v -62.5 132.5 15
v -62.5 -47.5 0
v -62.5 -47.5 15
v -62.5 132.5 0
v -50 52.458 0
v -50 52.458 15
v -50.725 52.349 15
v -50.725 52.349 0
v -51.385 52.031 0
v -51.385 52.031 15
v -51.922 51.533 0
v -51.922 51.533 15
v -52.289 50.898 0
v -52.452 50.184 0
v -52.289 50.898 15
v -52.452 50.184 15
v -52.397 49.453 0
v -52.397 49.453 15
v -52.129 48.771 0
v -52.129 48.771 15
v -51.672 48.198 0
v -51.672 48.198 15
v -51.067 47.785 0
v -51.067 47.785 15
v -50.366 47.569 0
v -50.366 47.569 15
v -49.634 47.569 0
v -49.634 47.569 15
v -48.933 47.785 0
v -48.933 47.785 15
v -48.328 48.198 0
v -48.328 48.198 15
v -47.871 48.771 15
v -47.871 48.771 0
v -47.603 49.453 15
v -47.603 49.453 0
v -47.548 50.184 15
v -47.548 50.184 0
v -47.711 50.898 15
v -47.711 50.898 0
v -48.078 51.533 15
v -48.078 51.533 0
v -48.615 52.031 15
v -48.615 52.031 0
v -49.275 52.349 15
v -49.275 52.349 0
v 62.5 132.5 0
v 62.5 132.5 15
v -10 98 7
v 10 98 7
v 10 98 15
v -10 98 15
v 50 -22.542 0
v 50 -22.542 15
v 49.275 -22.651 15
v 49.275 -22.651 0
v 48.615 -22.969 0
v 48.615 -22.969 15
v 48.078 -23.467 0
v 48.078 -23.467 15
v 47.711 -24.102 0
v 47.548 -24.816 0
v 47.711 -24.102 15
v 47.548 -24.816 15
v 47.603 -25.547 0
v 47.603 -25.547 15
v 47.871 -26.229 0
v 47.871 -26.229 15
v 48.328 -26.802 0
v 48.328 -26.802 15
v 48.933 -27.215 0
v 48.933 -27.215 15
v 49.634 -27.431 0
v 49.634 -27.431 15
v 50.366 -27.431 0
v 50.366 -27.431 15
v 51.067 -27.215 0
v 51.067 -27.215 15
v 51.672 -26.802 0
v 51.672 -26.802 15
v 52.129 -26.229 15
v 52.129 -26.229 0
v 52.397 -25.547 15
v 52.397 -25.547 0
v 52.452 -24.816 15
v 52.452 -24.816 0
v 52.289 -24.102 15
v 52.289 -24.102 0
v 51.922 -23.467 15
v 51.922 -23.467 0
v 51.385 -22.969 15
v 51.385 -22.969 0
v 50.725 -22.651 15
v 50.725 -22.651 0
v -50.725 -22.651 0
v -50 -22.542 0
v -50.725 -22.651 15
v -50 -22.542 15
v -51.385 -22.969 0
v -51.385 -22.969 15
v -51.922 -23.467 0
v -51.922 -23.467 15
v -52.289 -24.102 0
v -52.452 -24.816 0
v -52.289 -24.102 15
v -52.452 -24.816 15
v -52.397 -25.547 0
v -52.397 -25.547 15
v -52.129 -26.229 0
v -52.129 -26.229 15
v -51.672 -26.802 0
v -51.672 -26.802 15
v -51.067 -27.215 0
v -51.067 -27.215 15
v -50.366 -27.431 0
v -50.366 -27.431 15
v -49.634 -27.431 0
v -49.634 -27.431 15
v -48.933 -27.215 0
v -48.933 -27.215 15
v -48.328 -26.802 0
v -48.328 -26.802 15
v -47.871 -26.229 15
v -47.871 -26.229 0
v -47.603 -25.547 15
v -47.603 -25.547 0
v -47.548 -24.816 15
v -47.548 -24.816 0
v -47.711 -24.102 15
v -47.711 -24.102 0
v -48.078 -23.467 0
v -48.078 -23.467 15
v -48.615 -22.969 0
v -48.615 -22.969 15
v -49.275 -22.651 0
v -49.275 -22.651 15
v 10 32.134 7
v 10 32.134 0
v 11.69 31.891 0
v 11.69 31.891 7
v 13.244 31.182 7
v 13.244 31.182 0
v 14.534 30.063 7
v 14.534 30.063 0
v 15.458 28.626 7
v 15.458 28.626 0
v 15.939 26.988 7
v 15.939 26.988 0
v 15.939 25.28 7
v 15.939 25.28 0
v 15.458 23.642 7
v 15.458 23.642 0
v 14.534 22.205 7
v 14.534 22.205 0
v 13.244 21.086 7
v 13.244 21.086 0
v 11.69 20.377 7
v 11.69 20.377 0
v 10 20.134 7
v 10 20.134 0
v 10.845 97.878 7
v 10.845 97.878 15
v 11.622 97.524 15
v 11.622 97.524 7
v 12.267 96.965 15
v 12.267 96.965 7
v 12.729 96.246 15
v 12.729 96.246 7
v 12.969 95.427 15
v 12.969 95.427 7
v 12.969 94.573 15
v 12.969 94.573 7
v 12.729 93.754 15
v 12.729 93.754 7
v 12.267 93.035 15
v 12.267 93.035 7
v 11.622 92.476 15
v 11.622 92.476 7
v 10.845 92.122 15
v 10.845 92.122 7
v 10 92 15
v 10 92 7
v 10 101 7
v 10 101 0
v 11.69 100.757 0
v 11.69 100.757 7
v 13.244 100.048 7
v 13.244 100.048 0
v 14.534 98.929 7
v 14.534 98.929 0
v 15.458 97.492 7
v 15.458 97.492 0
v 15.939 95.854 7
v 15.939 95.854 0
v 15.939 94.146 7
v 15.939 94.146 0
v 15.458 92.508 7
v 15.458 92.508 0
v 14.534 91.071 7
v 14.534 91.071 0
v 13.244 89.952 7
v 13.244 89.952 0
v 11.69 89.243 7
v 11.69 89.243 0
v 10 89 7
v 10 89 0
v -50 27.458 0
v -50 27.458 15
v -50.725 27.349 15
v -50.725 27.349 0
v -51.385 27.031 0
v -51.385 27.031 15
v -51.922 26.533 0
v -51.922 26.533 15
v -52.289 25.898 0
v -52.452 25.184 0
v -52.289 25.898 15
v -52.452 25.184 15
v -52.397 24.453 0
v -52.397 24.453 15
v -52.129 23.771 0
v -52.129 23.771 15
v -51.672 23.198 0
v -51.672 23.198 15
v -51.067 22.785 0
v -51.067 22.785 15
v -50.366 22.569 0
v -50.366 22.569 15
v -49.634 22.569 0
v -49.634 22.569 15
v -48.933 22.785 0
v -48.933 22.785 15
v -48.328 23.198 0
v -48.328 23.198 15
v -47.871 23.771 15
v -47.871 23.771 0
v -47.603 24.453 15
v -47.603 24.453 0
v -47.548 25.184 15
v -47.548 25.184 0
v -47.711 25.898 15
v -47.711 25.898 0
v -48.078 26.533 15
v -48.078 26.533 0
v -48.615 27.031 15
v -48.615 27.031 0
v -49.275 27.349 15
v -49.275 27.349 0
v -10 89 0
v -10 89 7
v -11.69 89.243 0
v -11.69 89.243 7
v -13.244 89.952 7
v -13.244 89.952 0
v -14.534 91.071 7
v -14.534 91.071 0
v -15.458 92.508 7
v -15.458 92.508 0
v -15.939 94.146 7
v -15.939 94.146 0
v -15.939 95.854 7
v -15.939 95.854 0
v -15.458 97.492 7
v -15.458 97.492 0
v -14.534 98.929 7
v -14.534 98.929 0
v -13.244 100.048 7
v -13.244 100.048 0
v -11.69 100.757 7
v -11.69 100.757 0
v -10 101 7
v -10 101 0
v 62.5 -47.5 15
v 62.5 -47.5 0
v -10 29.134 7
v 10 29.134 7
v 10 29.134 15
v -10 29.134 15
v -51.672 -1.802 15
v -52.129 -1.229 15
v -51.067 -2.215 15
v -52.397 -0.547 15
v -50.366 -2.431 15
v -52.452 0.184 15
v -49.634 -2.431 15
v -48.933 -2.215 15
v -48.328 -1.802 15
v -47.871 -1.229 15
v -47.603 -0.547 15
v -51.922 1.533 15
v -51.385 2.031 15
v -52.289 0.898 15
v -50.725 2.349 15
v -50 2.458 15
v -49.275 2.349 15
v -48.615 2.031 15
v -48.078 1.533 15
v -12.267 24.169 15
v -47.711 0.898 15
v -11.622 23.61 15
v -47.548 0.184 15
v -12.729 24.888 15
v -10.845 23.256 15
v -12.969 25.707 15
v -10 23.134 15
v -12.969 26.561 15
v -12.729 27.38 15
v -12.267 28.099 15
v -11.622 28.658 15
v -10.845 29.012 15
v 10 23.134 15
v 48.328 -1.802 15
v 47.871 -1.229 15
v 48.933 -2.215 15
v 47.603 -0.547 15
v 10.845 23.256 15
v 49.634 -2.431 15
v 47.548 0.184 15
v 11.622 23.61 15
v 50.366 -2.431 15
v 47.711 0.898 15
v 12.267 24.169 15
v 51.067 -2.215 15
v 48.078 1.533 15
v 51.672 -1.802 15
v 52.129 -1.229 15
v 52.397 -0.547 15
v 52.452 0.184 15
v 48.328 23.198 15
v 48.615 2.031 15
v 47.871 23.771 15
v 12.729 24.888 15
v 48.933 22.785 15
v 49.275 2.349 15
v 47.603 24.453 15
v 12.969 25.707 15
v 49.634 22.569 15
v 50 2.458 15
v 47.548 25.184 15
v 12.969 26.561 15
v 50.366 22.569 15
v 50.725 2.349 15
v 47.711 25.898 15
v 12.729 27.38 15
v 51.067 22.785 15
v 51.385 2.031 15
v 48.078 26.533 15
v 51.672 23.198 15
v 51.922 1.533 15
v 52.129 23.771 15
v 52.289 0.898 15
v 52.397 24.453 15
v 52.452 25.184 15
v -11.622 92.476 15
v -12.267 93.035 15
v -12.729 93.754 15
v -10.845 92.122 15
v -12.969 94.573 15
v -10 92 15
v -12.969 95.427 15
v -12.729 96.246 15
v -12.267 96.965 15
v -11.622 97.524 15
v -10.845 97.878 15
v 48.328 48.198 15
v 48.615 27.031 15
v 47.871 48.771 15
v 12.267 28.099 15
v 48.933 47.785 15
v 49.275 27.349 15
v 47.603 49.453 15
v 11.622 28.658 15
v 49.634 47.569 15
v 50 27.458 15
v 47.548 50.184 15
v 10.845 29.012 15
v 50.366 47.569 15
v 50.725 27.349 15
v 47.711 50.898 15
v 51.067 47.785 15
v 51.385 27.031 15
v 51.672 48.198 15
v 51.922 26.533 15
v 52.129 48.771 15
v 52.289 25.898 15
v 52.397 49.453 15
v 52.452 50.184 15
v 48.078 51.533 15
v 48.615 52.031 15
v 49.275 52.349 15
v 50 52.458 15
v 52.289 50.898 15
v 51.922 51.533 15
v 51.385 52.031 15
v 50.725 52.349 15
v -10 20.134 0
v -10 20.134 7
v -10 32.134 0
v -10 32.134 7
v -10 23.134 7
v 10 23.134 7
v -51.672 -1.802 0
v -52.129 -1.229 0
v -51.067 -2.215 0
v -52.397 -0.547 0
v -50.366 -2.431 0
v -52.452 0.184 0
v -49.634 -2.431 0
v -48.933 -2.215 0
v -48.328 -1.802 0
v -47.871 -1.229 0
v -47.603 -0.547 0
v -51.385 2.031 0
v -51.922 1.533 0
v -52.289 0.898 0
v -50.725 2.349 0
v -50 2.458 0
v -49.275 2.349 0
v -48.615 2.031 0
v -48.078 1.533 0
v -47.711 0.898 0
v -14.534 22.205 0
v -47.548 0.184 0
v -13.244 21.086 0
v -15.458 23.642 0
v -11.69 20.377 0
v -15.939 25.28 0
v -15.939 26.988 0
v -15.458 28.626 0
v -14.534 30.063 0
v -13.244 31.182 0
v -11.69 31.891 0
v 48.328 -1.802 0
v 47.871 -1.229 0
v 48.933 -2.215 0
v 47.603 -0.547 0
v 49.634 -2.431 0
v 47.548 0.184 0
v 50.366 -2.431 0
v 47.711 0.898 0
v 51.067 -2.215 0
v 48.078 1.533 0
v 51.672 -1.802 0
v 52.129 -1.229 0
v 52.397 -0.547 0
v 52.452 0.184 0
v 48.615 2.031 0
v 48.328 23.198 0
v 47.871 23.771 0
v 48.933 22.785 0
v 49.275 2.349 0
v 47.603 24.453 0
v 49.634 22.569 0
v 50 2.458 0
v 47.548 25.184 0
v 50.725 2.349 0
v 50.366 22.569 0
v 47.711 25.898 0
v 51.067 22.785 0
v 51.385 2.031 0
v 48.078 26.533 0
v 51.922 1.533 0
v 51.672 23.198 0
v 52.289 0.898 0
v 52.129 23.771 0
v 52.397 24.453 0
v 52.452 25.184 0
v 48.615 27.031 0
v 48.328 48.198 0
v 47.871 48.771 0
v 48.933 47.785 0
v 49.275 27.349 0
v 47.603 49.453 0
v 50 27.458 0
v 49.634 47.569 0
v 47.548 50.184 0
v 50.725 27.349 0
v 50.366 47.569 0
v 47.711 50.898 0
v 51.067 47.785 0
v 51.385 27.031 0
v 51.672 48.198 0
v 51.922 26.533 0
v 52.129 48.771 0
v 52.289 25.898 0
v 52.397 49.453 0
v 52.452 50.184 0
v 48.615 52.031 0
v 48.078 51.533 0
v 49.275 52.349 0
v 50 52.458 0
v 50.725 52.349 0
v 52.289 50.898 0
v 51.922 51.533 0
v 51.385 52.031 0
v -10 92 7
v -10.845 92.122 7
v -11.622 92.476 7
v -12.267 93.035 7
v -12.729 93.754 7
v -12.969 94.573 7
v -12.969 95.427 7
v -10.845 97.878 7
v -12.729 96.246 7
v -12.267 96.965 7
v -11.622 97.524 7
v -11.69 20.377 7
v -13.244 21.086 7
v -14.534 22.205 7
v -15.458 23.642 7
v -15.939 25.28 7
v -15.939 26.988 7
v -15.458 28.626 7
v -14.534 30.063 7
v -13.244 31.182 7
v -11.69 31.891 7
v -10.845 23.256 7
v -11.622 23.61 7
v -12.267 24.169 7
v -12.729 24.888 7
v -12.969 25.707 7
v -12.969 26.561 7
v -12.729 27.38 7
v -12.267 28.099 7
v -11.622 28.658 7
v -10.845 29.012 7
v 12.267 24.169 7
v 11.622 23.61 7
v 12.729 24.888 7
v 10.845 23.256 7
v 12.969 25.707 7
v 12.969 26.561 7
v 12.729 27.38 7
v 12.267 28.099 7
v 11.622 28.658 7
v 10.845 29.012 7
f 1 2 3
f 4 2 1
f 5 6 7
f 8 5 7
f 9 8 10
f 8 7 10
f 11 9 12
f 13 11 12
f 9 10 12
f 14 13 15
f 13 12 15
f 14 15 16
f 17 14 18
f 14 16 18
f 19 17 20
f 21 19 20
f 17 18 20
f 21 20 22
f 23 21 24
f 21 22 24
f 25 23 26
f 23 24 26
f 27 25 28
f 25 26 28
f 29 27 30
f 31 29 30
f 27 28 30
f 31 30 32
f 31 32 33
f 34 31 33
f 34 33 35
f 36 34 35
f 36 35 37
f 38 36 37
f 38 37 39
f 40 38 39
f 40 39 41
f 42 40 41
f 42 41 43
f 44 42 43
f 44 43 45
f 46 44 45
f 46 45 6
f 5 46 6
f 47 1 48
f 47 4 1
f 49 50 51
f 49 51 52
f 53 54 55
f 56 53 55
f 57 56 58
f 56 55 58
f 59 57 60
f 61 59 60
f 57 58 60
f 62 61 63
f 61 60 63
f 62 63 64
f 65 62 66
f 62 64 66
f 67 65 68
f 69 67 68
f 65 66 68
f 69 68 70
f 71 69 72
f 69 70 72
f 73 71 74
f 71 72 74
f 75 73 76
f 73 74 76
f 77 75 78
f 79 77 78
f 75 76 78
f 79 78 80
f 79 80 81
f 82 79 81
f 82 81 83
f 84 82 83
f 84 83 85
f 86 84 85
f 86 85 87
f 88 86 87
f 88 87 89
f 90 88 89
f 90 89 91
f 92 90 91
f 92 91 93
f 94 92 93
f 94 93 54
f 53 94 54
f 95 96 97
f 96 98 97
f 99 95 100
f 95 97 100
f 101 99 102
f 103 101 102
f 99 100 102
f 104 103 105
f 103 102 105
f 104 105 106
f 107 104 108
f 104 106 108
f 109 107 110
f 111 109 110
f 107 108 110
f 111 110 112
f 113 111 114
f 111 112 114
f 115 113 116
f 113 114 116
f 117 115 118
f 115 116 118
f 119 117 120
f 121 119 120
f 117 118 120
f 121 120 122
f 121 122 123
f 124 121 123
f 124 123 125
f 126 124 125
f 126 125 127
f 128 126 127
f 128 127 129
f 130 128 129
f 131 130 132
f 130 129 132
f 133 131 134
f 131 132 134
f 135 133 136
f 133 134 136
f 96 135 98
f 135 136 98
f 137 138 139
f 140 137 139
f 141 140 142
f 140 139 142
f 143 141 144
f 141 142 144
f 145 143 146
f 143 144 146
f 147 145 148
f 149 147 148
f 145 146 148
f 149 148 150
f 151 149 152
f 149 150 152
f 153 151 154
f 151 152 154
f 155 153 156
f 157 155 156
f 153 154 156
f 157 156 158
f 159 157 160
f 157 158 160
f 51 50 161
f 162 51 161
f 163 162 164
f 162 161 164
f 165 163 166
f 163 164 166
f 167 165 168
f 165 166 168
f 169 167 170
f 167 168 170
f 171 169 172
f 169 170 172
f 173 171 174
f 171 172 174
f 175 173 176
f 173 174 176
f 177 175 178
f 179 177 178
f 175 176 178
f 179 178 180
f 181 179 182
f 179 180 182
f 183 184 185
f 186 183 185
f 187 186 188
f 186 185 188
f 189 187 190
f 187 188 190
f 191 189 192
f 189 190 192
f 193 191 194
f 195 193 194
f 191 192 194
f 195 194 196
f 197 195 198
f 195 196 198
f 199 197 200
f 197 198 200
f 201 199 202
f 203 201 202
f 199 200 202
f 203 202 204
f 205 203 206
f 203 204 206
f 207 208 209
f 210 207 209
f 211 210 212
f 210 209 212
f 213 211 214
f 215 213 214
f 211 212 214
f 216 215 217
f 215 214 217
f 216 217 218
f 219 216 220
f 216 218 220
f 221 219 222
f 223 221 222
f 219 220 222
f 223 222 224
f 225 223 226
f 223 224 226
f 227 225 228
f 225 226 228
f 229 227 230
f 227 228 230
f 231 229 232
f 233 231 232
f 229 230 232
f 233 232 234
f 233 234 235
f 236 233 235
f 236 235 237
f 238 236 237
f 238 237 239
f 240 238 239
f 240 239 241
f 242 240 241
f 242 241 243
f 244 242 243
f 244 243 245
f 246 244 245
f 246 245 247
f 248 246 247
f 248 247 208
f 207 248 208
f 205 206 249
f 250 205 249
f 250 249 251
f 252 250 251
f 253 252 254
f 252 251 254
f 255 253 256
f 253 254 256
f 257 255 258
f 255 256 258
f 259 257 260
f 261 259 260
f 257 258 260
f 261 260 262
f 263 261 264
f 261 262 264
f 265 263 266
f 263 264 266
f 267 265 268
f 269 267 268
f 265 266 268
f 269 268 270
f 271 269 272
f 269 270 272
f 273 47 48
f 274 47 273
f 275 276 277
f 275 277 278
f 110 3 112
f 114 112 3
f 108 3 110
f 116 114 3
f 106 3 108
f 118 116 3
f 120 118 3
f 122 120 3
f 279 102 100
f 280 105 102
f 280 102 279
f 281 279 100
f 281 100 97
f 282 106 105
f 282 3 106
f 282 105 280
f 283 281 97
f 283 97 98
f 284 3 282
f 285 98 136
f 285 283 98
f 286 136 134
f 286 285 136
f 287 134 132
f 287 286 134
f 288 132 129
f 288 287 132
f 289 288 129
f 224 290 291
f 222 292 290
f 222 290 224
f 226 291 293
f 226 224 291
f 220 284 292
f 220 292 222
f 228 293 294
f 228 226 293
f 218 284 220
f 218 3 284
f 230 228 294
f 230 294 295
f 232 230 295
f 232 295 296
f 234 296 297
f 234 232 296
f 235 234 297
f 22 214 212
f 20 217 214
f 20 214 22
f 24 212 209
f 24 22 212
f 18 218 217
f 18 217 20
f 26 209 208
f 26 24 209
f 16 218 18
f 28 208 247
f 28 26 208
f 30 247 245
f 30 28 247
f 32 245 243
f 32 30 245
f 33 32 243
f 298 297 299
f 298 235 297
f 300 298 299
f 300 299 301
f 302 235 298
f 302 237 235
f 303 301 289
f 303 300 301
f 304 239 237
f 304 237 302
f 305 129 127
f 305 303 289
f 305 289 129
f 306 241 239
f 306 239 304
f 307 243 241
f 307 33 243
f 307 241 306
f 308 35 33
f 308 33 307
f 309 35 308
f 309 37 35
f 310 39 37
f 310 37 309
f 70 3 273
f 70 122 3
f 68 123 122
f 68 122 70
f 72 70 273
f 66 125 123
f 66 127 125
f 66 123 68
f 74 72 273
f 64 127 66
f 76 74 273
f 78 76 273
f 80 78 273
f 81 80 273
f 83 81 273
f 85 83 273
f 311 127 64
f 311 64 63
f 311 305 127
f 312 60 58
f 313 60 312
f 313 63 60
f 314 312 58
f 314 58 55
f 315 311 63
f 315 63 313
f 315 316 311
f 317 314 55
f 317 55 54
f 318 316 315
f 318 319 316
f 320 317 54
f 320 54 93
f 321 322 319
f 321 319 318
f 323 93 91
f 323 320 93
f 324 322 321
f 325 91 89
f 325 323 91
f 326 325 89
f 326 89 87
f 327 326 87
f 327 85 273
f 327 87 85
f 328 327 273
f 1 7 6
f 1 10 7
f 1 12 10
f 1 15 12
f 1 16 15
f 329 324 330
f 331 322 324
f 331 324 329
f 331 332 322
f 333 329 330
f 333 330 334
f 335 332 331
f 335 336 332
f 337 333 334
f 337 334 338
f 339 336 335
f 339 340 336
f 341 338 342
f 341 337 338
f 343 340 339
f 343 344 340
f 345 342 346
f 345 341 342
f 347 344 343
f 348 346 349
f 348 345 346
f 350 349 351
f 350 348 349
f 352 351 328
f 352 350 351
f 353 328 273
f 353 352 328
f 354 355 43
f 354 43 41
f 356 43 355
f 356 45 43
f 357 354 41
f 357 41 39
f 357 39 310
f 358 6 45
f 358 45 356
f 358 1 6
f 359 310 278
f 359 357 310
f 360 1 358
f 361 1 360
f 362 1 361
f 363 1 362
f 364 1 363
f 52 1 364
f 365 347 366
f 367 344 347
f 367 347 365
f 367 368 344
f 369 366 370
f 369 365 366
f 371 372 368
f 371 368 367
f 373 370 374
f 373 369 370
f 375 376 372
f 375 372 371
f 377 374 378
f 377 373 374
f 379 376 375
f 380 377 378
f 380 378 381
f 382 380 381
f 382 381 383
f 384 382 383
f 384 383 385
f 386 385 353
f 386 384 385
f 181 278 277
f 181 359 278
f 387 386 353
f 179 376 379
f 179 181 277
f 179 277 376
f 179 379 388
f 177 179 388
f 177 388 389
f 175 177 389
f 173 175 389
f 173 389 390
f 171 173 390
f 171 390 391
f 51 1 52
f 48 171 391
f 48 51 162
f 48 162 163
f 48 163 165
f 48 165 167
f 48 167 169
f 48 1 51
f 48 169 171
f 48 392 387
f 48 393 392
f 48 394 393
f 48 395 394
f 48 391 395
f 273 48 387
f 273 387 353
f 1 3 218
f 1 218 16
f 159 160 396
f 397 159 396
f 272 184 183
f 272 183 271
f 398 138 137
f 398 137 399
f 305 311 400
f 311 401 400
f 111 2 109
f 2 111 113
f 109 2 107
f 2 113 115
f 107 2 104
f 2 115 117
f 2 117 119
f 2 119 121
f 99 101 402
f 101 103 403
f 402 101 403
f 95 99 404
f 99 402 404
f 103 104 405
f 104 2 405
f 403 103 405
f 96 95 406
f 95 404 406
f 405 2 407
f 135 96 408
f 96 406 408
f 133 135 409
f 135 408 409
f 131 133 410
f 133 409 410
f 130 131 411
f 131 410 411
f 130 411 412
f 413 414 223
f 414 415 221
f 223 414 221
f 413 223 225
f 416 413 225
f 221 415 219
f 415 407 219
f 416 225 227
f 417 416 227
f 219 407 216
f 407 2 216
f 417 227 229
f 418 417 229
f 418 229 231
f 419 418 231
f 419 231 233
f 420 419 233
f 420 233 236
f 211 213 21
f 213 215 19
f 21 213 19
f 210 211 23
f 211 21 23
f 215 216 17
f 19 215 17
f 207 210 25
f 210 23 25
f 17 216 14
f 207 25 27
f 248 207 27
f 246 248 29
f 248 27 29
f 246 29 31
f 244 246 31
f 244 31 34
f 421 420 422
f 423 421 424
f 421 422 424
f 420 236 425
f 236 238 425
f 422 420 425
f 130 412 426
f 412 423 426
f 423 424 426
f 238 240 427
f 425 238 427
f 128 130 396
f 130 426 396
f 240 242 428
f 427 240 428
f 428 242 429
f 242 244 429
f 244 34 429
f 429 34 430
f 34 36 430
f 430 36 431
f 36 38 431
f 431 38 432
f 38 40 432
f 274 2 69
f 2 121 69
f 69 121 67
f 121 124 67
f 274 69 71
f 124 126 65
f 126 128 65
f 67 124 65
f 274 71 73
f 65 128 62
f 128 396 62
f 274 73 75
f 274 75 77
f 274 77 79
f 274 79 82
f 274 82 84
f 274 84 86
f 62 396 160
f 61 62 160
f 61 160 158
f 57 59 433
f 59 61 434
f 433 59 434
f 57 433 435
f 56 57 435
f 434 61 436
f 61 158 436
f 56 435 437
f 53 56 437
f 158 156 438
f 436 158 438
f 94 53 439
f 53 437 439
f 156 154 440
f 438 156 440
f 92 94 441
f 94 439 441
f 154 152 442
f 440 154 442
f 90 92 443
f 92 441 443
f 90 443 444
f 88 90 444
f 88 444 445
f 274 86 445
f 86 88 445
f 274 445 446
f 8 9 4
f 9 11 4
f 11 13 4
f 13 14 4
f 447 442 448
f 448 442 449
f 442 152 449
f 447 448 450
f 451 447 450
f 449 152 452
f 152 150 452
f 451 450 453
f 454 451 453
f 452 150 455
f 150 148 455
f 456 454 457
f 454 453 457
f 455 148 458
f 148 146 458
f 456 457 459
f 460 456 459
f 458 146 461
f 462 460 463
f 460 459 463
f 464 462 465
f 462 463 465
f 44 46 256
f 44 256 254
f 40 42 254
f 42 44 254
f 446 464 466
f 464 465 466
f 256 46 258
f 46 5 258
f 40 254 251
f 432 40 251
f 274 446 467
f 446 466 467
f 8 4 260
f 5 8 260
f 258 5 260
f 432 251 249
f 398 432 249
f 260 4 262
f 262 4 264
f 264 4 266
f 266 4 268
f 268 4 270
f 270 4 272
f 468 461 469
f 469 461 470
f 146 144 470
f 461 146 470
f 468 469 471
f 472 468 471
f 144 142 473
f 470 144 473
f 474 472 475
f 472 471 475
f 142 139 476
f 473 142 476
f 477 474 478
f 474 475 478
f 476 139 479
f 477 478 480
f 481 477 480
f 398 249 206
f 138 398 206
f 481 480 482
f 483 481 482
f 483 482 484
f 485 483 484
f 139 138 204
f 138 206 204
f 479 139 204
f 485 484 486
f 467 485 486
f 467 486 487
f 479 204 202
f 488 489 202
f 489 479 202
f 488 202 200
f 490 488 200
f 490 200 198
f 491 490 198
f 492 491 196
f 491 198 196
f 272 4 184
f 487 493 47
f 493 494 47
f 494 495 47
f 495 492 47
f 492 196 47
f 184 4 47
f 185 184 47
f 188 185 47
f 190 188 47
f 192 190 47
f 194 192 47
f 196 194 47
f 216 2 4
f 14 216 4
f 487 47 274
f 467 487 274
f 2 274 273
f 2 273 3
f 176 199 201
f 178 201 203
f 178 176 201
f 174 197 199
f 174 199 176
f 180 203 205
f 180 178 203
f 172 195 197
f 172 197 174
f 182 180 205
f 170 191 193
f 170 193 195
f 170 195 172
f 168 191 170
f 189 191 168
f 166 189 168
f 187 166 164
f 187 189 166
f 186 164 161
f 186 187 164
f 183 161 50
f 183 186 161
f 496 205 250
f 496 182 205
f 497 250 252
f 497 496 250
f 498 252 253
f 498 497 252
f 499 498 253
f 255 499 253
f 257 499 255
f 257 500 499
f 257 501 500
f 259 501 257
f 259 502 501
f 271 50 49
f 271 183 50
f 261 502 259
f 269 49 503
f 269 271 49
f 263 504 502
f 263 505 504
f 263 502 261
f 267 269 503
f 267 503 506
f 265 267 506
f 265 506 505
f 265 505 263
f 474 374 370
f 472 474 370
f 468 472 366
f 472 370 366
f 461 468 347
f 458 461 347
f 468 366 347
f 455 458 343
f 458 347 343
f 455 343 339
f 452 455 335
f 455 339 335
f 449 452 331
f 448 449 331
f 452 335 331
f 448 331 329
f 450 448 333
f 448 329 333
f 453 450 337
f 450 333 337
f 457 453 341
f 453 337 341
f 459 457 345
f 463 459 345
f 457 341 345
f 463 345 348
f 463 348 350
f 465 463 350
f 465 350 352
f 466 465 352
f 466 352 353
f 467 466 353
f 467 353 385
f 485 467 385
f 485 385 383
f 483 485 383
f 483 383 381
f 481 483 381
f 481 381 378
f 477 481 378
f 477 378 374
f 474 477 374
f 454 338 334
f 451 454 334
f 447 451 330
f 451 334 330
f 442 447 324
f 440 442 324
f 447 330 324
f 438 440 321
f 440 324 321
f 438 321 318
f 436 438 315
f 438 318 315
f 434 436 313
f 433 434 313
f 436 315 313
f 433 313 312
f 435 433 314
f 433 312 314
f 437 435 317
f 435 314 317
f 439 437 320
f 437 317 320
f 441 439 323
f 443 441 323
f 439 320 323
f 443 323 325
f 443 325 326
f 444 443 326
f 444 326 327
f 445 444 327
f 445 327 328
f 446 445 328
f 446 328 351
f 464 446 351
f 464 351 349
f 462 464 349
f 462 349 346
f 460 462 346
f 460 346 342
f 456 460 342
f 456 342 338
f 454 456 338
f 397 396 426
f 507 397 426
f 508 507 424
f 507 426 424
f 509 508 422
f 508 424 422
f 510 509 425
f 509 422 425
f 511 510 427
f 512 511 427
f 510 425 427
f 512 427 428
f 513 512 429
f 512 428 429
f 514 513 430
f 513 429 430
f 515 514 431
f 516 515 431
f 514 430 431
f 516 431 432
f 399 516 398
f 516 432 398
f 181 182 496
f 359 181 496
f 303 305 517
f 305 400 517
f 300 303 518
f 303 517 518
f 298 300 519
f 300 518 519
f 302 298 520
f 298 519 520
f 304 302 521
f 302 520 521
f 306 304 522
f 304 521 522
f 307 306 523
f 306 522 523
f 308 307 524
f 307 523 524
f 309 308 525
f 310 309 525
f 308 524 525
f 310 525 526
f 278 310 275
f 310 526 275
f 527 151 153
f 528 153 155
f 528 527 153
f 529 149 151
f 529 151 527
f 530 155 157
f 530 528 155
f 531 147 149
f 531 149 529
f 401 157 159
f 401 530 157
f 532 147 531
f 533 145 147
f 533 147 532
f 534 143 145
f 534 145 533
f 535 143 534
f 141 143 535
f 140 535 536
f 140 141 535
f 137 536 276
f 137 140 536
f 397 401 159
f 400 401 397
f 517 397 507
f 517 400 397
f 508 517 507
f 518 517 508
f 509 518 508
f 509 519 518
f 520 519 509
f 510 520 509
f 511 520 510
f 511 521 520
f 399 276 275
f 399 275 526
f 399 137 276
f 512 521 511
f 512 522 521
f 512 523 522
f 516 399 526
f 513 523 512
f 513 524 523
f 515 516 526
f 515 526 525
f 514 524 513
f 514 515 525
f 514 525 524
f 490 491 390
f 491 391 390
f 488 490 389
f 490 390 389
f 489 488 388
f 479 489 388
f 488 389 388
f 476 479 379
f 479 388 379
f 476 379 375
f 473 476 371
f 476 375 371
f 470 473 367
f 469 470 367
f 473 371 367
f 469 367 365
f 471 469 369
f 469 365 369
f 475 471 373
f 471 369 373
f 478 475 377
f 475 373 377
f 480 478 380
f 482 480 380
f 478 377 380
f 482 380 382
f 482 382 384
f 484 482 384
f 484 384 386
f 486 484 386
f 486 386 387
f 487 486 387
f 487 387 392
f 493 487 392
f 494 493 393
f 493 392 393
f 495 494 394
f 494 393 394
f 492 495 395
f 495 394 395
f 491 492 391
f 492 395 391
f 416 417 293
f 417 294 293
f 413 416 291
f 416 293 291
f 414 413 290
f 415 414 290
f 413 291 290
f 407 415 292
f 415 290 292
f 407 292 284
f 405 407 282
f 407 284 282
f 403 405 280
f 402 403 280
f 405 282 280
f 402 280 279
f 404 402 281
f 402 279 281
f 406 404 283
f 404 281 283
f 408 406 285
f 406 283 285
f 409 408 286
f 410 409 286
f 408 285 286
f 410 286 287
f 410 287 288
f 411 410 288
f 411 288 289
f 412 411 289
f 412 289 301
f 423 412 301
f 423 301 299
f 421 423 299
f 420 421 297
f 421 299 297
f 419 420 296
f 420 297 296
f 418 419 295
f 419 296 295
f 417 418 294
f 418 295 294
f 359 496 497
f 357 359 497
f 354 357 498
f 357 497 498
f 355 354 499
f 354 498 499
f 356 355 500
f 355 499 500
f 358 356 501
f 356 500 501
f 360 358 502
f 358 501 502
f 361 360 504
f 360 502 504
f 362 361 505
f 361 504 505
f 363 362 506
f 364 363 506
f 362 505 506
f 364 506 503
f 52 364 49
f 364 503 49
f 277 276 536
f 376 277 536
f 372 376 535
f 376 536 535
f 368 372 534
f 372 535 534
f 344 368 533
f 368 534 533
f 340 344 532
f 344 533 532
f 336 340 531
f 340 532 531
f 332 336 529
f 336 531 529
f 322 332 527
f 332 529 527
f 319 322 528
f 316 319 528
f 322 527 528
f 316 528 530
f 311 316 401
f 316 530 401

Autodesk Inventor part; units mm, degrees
ref_plane "YZ Plane" through (0, 0, 0) normal (1, 0, 0) x (0, 1, 0)
ref_plane "XZ Plane" through (0, 0, 0) normal (0, 1, 0) x (-1, 0, 0)
sketch "Sketch1" plane through (0, 0, 0) normal (0, 0, 1) x (1, 0, 0)
  circle A0 centre (5, 95) radius 3 construction
  arc A1 (-53, -30) -> (-47, -30) centre (-50, -30) ccw construction
  line L0 (-53, -30) -> (-53, 30) construction
  arc A2 (-47, 30) -> (-53, 30) centre (-50, 30) ccw construction
  line L1 (-47, 30) -> (-47, -30) construction
  arc A3 (47, -30) -> (53, -30) centre (50, -30) ccw construction
  line L2 (47, -30) -> (47, 30) construction
  arc A4 (53, 30) -> (47, 30) centre (50, 30) ccw construction
  line L3 (53, 30) -> (53, -30) construction
  circle A5 centre (31.5, 31.5) radius 6 construction
  circle A6 centre (-31.5, 31.5) radius 6 construction
  circle A7 centre (-31.5, -31.5) radius 6 construction
  circle A8 centre (31.5, -31.5) radius 6 construction
  line L4 (62.5, 47.5) -> (-62.5, 47.5) construction
  line L5 (-62.5, 47.5) -> (-62.5, -47.5) construction
  line L6 (-62.5, -47.5) -> (62.5, -47.5) construction
  line L7 (62.5, -47.5) -> (62.5, 47.5) construction
  line L8 (62.5, -47.5) -> (-62.5, -47.5)
  line L9 (-62.5, -47.5) -> (-62.5, 132.5)
  line L10 (-62.5, 132.5) -> (62.5, 132.5)
  line L11 (62.5, 132.5) -> (62.5, -47.5)
  point P0 (0, 0)
  dimension "d0" = 180
  dimension "d1" = 125
ref_plane "Work Plane1" through (-75, -725, 15) normal (0, 0, -1) x (0, 1, 0)
extrude "Extrusion1" add sketch "Sketch1" along normal up to surface (15 mm away)
sketch "Sketch2" plane through (0, 0, 0) normal (0, 0, -1) x (-1, 0, 0)
  line L0 (-62.5, -47.5) -> (62.5, -47.5) projected
  arc A0 (47, -30) -> (53, -30) centre (50, -30) ccw construction
  arc A1 (53, 30) -> (47, 30) centre (50, 30) ccw construction
  line L1 (47, 30) -> (47, -30) construction
  line L2 (53, -30) -> (53, 30) construction
  point P0 (0, 0)
  point P1 (50, -25)
  point P2 (50, 0)
  point P3 (50, 25)
  point P4 (-50, -25)
  point P5 (-50, 0)
  point P6 (-50, 25)
  point P7 (50, 50)
  point P8 (-50, 50)
  dimension "d5" = 55
  dimension "d8" = 25
  dimension "d11" = 100
hole "Hole1" at (-50, -25, 0) at (-50, 0, 0) at (-50, 25, 0) at (50, -25, 0) at (50, 0, 0) at (50, 25, 0) at (-50, 50, 0) at (50, 50, 0) direction (0, 0, 1) diameter 4.917 end through all thread size "M6x1" class "6H" standard "ANSI Metric M Profile"
sketch "Sketch4" plane through (0, 0, 0) normal (0, 0, -1) x (-1, 0, 0)
  circle A0 centre (-5, 95) radius 3 projected
  line L0 (0, -83.5) -> (0, 168.5) projected
  line L1 (-10, 95) -> (10, 95) construction
  line L2 (-10, 92) -> (10, 92)
  line L3 (-10, 98) -> (10, 98)
  arc A1 (10, 92) -> (10, 98) centre (10, 95) ccw
  arc A2 (-10, 98) -> (-10, 92) centre (-10, 95) ccw
  line L4 (-62.5, 47.5) -> (62.5, 47.5) construction
  line L5 (-10, 26.134) -> (10, 26.134) construction
  line L6 (-10, 23.134) -> (10, 23.134)
  line L7 (-10, 29.134) -> (10, 29.134)
  arc A3 (10, 23.134) -> (10, 29.134) centre (10, 26.134) ccw
  arc A4 (-10, 29.134) -> (-10, 23.134) centre (-10, 26.134) ccw
  point P0 (0, 0)
  dimension "d21" = 20
  dimension "d22" = 3
  dimension "d23" = 3
  dimension "d24" = 6
  dimension "d27" = 47.5
  dimension "d30" = 68.866
extrude "Extrusion2" cut sketch "Sketch4" against normal blind 15
sketch "Sketch5" plane through (0, 0, 0) normal (0, 0, -1) x (-1, 0, 0)
  arc A0 (10, 92) -> (10, 98) centre (10, 95) ccw projected
  line L0 (10, 92) -> (-10, 92) projected
  arc A1 (-10, 98) -> (-10, 92) centre (-10, 95) ccw projected
  line L1 (-10, 98) -> (10, 98) projected
  arc A2 (10, 23.134) -> (10, 29.134) centre (10, 26.134) ccw projected
  line L2 (10, 23.134) -> (-10, 23.134) projected
  arc A3 (-10, 29.134) -> (-10, 23.134) centre (-10, 26.134) ccw projected
  line L3 (-10, 29.134) -> (10, 29.134) projected
  arc A4 (10, 92) -> (10, 98) centre (10, 95) ccw projected
  line L4 (10, 92) -> (-10, 92) projected
  arc A5 (-10, 98) -> (-10, 92) centre (-10, 95) ccw projected
  line L5 (-10, 98) -> (10, 98) projected
  circle A6 centre (-50, 50) radius 2.4585 projected
  circle A7 centre (50, 50) radius 2.4585 projected
  circle A8 centre (-50, 25) radius 2.4585 projected
  circle A9 centre (-50, 0) radius 2.4585 projected
  circle A10 centre (-50, -25) radius 2.4585 projected
  circle A11 centre (50, 25) radius 2.4585 projected
  circle A12 centre (50, 0) radius 2.4585 projected
  circle A13 centre (50, -25) radius 2.4585 projected
  line L6 (-62.5, -47.5) -> (62.5, -47.5) projected
  line L7 (62.5, -47.5) -> (62.5, 132.5) projected
  line L8 (62.5, 132.5) -> (-62.5, 132.5) projected
  line L9 (-62.5, 132.5) -> (-62.5, -47.5) projected
  line L10 (-10, 89) -> (10, 89)
  line L11 (-10, 101) -> (10, 101)
  arc A14 (10, 89) -> (10, 101) centre (10, 95) ccw
  arc A15 (-10, 101) -> (-10, 89) centre (-10, 95) ccw
  line L12 (0, -83.5) -> (0, 168.5) projected
  line L13 (-10, 20.134) -> (10, 20.134)
  line L14 (-10, 32.134) -> (10, 32.134)
  arc A16 (10, 20.134) -> (10, 32.134) centre (10, 26.134) ccw
  arc A17 (-10, 32.134) -> (-10, 20.134) centre (-10, 26.134) ccw
  point P0 (0, 0)
  dimension "d35" = 12
  dimension "d36" = 6
  dimension "d37" = 6
  dimension "d38" = 6
  dimension "d41" = 68.866
extrude "Extrusion3" cut sketch "Sketch5" against normal blind 7 contours A0 L1 L12 L11 A14 L10 L0 | L12 L10 A15 L11 L1 A1 L0 | L14 A16 L13 L12 L2 A2 L3 | L12 L3 A3 L2 L13 A17 L14
properties part number "MacroBasePlate_V1"
